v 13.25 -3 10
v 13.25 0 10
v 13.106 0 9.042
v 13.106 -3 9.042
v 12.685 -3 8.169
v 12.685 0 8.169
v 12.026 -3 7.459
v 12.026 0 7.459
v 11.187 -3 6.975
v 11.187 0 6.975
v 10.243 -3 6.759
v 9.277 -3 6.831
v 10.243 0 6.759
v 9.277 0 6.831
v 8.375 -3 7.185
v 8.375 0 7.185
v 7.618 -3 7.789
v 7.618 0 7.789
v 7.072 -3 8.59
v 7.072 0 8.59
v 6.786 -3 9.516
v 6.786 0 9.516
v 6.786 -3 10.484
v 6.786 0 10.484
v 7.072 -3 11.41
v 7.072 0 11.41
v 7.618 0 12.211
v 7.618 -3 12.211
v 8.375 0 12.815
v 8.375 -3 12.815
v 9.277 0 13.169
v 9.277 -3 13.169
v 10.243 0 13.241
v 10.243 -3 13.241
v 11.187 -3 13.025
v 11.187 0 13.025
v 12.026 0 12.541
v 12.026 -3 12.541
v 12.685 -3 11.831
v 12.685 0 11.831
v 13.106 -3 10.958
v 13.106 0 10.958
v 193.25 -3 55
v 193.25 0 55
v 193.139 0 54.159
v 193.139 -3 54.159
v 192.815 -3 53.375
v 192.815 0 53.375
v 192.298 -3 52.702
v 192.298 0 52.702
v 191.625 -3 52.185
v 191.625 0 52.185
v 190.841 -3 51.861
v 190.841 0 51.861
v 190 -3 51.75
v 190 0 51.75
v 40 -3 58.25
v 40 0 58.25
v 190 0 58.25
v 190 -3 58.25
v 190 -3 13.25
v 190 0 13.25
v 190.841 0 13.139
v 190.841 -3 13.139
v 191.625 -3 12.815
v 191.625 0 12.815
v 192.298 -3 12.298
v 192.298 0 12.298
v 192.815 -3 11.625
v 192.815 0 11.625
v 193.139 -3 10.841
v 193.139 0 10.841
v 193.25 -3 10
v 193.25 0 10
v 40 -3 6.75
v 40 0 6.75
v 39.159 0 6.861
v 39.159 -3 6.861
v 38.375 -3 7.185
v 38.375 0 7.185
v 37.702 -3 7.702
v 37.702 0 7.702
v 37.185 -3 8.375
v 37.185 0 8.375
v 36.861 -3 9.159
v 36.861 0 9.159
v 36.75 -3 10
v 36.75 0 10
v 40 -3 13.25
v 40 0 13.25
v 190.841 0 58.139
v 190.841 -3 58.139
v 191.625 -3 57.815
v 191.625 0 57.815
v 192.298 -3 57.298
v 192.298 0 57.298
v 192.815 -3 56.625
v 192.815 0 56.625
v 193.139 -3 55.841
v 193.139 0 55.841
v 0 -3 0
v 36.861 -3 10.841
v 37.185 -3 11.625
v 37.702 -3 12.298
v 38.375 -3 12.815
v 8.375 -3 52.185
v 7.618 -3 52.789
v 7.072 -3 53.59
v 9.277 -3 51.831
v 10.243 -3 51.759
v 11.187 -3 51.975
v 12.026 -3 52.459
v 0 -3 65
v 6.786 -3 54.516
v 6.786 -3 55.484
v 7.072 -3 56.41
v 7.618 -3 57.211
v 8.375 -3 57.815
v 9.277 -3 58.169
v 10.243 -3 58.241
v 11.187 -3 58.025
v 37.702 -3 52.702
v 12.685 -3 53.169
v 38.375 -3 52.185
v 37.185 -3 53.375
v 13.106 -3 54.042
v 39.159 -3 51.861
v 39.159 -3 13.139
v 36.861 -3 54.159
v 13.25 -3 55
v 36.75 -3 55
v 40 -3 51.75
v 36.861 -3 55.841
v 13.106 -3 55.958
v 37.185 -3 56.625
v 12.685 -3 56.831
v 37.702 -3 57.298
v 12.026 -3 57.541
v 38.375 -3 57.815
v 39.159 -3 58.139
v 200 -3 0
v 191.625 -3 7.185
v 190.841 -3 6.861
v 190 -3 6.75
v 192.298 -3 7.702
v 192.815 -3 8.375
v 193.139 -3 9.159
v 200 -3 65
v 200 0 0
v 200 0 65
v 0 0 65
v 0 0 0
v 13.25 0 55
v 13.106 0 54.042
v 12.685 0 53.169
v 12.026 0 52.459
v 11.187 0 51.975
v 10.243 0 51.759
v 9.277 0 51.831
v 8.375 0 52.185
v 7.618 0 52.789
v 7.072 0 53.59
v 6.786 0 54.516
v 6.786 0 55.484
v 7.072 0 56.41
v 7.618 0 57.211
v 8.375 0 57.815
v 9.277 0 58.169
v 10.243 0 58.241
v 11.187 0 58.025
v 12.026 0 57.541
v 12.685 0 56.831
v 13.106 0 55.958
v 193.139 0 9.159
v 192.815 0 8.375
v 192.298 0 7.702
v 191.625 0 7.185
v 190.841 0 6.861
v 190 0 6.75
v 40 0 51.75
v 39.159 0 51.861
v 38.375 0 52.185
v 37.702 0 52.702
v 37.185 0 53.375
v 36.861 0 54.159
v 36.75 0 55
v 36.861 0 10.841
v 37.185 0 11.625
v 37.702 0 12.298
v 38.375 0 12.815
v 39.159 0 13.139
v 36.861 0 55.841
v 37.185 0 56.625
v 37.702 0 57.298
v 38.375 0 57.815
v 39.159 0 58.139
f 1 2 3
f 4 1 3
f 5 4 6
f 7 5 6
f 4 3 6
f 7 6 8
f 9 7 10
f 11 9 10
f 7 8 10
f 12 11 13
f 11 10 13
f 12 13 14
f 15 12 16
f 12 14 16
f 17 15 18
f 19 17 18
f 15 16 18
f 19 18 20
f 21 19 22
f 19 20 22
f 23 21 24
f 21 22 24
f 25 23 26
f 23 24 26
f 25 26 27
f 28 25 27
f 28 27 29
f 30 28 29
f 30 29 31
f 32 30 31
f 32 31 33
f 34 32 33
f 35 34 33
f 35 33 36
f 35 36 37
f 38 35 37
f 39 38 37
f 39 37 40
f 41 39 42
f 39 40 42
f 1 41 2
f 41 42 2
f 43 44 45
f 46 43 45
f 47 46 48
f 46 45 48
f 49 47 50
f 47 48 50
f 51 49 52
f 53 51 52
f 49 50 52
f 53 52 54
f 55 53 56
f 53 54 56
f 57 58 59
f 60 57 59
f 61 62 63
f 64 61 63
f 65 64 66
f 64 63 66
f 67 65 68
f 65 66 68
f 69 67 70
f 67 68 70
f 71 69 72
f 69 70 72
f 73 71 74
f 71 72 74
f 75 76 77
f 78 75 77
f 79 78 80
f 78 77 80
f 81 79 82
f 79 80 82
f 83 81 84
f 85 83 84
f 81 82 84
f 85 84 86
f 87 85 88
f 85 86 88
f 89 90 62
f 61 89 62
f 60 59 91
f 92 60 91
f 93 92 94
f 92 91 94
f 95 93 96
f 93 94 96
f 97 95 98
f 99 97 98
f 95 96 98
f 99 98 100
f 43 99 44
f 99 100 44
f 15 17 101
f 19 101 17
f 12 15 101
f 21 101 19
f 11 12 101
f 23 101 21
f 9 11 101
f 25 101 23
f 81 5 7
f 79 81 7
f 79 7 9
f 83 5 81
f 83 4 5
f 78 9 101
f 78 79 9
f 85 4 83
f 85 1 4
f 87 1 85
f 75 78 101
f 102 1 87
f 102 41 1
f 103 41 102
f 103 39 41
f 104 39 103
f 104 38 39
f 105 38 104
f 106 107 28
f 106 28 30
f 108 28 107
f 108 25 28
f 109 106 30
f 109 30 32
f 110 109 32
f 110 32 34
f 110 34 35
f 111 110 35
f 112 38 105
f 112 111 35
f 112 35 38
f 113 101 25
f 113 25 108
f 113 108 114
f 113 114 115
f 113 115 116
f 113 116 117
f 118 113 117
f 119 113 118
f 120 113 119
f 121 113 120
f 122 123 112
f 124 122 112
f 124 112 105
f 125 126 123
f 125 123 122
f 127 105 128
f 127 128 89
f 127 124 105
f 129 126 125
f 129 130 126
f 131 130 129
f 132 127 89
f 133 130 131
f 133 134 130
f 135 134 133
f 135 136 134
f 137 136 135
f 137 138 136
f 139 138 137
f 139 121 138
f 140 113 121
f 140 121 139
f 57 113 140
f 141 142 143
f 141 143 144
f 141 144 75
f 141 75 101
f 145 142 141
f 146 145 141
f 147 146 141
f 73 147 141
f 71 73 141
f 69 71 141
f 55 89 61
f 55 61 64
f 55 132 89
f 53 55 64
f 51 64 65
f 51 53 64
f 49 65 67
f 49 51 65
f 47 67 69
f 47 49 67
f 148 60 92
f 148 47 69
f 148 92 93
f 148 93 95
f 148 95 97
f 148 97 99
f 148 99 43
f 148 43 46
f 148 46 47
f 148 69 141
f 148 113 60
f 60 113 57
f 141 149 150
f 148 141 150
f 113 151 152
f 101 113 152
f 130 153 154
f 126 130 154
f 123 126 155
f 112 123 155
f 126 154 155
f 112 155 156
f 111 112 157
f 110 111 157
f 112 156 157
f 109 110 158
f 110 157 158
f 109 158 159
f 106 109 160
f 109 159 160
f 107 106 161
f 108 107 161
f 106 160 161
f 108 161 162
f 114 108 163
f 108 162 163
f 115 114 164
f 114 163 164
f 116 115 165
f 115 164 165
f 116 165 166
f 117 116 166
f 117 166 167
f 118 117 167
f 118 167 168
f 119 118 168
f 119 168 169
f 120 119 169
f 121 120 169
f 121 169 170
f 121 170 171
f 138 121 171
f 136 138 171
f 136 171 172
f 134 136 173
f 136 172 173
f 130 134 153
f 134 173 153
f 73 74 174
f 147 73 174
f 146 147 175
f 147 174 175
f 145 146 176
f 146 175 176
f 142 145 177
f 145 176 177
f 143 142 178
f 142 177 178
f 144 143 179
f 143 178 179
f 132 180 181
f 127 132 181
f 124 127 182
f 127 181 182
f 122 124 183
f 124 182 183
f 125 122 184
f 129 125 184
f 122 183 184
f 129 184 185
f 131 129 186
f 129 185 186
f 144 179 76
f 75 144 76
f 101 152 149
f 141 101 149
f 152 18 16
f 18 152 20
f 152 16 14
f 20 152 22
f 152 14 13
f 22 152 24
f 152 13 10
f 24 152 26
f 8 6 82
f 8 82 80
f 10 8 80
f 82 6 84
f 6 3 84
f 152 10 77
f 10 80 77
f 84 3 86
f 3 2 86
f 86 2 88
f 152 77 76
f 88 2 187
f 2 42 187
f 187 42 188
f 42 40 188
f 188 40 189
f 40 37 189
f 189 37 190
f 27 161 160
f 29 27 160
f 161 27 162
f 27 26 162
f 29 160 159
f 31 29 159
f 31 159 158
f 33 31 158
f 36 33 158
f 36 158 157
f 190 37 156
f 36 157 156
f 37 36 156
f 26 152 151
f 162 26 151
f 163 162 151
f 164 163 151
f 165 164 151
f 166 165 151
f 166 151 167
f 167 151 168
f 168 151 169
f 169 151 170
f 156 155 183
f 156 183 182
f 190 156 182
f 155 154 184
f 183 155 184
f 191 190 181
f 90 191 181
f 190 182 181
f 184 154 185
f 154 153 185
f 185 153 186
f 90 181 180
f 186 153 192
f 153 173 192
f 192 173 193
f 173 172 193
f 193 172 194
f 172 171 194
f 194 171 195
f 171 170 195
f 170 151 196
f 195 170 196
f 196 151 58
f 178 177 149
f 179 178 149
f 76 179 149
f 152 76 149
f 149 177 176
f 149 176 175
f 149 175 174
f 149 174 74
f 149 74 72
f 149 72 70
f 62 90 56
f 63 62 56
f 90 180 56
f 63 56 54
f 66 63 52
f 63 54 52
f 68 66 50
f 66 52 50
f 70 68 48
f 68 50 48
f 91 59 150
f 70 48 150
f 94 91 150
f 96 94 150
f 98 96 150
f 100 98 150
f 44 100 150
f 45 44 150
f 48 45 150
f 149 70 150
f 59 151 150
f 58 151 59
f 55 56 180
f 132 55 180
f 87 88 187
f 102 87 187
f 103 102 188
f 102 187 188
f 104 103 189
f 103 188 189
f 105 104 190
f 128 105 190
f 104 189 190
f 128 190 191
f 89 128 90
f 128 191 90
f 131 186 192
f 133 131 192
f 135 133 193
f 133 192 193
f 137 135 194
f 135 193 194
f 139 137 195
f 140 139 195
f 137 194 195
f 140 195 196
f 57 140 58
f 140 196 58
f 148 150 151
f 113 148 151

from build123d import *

# Parameters (mm, degrees)
F1_DEPTH = 3


# Not quite as in the source:
# - a feature names something its author has since deleted; it is built from what else it names


with BuildPart() as f1:
    # F0 (on Front) → F1 (new body)
    with BuildSketch(Plane.XZ):
        with BuildLine():
            Line((0, 65), (0, 55))
            Line((0, 55), (6.75, 55))
            ThreePointArc((6.75, 55), (10, 58.25), (13.25, 55))
            Line((13.25, 55), (36.75, 55))
            ThreePointArc((36.75, 55), (37.7019029611, 57.2980970389), (40, 58.25))
            Line((40, 58.25), (100, 58.25))
            Line((100, 58.25), (100, 65))
            Line((100, 65), (0, 65))
        make_face()
        with BuildLine():
            Line((0, 55), (0, 32.5))
            Line((0, 32.5), (30, 32.5))
            Line((30, 32.5), (100, 32.5))
            Line((100, 32.5), (100, 51.75))
            Line((100, 51.75), (40, 51.75))
            ThreePointArc((40, 51.75), (37.7019029611, 52.7019029611), (36.75, 55))
            Line((36.75, 55), (13.25, 55))
            ThreePointArc((13.25, 55), (10, 51.75), (6.75, 55))
            Line((6.75, 55), (0, 55))
        make_face()
        with BuildLine():
            Line((0, 32.5), (0, 10))
            Line((0, 10), (6.75, 10))
            ThreePointArc((6.75, 10), (10, 13.25), (13.25, 10))
            Line((13.25, 10), (30, 10))
            Line((30, 10), (30, 32.5))
            Line((30, 32.5), (0, 32.5))
        make_face()
        with BuildLine():
            Line((0, 10), (0, 0))
            Line((0, 0), (30, 0))
            Line((30, 0), (30, 10))
            Line((30, 10), (13.25, 10))
            ThreePointArc((13.25, 10), (10, 6.75), (6.75, 10))
            Line((6.75, 10), (0, 10))
        make_face()
        with BuildLine():
            Line((30, 32.5), (30, 10))
            Line((30, 10), (36.75, 10))
            ThreePointArc((36.75, 10), (37.7019029611, 12.2980970389), (40, 13.25))
            Line((40, 13.25), (100, 13.25))
            Line((100, 13.25), (100, 32.5))
            Line((100, 32.5), (30, 32.5))
        make_face()
        with BuildLine():
            Line((30, 10), (30, 0))
            Line((30, 0), (100, 0))
            Line((100, 0), (100, 6.75))
            Line((100, 6.75), (40, 6.75))
            ThreePointArc((40, 6.75), (37.7019029611, 7.7019029611), (36.75, 10))
            Line((36.75, 10), (30, 10))
        make_face()
        with BuildLine():
            Line((100, 32.5), (200, 32.5))
            Line((200, 32.5), (200, 65))
            Line((200, 65), (100, 65))
            Line((100, 65), (100, 58.25))
            Line((100, 58.25), (190, 58.25))
            ThreePointArc((190, 58.25), (192.2980970389, 57.2980970389), (193.25, 55))
            ThreePointArc((193.25, 55), (192.2980970389, 52.7019029611), (190, 51.75))
            Line((190, 51.75), (100, 51.75))
            Line((100, 51.75), (100, 32.5))
        make_face()
        with BuildLine():
            Line((100, 6.75), (100, 0))
            Line((100, 0), (200, 0))
            Line((200, 0), (200, 32.5))
            Line((200, 32.5), (100, 32.5))
            Line((100, 32.5), (100, 13.25))
            Line((100, 13.25), (190, 13.25))
            ThreePointArc((190, 13.25), (192.2980970389, 12.2980970389), (193.25, 10))
            ThreePointArc((193.25, 10), (192.2980970389, 7.7019029611), (190, 6.75))
            Line((190, 6.75), (100, 6.75))
        make_face()
    extrude(amount=F1_DEPTH)


solid = f1.part
